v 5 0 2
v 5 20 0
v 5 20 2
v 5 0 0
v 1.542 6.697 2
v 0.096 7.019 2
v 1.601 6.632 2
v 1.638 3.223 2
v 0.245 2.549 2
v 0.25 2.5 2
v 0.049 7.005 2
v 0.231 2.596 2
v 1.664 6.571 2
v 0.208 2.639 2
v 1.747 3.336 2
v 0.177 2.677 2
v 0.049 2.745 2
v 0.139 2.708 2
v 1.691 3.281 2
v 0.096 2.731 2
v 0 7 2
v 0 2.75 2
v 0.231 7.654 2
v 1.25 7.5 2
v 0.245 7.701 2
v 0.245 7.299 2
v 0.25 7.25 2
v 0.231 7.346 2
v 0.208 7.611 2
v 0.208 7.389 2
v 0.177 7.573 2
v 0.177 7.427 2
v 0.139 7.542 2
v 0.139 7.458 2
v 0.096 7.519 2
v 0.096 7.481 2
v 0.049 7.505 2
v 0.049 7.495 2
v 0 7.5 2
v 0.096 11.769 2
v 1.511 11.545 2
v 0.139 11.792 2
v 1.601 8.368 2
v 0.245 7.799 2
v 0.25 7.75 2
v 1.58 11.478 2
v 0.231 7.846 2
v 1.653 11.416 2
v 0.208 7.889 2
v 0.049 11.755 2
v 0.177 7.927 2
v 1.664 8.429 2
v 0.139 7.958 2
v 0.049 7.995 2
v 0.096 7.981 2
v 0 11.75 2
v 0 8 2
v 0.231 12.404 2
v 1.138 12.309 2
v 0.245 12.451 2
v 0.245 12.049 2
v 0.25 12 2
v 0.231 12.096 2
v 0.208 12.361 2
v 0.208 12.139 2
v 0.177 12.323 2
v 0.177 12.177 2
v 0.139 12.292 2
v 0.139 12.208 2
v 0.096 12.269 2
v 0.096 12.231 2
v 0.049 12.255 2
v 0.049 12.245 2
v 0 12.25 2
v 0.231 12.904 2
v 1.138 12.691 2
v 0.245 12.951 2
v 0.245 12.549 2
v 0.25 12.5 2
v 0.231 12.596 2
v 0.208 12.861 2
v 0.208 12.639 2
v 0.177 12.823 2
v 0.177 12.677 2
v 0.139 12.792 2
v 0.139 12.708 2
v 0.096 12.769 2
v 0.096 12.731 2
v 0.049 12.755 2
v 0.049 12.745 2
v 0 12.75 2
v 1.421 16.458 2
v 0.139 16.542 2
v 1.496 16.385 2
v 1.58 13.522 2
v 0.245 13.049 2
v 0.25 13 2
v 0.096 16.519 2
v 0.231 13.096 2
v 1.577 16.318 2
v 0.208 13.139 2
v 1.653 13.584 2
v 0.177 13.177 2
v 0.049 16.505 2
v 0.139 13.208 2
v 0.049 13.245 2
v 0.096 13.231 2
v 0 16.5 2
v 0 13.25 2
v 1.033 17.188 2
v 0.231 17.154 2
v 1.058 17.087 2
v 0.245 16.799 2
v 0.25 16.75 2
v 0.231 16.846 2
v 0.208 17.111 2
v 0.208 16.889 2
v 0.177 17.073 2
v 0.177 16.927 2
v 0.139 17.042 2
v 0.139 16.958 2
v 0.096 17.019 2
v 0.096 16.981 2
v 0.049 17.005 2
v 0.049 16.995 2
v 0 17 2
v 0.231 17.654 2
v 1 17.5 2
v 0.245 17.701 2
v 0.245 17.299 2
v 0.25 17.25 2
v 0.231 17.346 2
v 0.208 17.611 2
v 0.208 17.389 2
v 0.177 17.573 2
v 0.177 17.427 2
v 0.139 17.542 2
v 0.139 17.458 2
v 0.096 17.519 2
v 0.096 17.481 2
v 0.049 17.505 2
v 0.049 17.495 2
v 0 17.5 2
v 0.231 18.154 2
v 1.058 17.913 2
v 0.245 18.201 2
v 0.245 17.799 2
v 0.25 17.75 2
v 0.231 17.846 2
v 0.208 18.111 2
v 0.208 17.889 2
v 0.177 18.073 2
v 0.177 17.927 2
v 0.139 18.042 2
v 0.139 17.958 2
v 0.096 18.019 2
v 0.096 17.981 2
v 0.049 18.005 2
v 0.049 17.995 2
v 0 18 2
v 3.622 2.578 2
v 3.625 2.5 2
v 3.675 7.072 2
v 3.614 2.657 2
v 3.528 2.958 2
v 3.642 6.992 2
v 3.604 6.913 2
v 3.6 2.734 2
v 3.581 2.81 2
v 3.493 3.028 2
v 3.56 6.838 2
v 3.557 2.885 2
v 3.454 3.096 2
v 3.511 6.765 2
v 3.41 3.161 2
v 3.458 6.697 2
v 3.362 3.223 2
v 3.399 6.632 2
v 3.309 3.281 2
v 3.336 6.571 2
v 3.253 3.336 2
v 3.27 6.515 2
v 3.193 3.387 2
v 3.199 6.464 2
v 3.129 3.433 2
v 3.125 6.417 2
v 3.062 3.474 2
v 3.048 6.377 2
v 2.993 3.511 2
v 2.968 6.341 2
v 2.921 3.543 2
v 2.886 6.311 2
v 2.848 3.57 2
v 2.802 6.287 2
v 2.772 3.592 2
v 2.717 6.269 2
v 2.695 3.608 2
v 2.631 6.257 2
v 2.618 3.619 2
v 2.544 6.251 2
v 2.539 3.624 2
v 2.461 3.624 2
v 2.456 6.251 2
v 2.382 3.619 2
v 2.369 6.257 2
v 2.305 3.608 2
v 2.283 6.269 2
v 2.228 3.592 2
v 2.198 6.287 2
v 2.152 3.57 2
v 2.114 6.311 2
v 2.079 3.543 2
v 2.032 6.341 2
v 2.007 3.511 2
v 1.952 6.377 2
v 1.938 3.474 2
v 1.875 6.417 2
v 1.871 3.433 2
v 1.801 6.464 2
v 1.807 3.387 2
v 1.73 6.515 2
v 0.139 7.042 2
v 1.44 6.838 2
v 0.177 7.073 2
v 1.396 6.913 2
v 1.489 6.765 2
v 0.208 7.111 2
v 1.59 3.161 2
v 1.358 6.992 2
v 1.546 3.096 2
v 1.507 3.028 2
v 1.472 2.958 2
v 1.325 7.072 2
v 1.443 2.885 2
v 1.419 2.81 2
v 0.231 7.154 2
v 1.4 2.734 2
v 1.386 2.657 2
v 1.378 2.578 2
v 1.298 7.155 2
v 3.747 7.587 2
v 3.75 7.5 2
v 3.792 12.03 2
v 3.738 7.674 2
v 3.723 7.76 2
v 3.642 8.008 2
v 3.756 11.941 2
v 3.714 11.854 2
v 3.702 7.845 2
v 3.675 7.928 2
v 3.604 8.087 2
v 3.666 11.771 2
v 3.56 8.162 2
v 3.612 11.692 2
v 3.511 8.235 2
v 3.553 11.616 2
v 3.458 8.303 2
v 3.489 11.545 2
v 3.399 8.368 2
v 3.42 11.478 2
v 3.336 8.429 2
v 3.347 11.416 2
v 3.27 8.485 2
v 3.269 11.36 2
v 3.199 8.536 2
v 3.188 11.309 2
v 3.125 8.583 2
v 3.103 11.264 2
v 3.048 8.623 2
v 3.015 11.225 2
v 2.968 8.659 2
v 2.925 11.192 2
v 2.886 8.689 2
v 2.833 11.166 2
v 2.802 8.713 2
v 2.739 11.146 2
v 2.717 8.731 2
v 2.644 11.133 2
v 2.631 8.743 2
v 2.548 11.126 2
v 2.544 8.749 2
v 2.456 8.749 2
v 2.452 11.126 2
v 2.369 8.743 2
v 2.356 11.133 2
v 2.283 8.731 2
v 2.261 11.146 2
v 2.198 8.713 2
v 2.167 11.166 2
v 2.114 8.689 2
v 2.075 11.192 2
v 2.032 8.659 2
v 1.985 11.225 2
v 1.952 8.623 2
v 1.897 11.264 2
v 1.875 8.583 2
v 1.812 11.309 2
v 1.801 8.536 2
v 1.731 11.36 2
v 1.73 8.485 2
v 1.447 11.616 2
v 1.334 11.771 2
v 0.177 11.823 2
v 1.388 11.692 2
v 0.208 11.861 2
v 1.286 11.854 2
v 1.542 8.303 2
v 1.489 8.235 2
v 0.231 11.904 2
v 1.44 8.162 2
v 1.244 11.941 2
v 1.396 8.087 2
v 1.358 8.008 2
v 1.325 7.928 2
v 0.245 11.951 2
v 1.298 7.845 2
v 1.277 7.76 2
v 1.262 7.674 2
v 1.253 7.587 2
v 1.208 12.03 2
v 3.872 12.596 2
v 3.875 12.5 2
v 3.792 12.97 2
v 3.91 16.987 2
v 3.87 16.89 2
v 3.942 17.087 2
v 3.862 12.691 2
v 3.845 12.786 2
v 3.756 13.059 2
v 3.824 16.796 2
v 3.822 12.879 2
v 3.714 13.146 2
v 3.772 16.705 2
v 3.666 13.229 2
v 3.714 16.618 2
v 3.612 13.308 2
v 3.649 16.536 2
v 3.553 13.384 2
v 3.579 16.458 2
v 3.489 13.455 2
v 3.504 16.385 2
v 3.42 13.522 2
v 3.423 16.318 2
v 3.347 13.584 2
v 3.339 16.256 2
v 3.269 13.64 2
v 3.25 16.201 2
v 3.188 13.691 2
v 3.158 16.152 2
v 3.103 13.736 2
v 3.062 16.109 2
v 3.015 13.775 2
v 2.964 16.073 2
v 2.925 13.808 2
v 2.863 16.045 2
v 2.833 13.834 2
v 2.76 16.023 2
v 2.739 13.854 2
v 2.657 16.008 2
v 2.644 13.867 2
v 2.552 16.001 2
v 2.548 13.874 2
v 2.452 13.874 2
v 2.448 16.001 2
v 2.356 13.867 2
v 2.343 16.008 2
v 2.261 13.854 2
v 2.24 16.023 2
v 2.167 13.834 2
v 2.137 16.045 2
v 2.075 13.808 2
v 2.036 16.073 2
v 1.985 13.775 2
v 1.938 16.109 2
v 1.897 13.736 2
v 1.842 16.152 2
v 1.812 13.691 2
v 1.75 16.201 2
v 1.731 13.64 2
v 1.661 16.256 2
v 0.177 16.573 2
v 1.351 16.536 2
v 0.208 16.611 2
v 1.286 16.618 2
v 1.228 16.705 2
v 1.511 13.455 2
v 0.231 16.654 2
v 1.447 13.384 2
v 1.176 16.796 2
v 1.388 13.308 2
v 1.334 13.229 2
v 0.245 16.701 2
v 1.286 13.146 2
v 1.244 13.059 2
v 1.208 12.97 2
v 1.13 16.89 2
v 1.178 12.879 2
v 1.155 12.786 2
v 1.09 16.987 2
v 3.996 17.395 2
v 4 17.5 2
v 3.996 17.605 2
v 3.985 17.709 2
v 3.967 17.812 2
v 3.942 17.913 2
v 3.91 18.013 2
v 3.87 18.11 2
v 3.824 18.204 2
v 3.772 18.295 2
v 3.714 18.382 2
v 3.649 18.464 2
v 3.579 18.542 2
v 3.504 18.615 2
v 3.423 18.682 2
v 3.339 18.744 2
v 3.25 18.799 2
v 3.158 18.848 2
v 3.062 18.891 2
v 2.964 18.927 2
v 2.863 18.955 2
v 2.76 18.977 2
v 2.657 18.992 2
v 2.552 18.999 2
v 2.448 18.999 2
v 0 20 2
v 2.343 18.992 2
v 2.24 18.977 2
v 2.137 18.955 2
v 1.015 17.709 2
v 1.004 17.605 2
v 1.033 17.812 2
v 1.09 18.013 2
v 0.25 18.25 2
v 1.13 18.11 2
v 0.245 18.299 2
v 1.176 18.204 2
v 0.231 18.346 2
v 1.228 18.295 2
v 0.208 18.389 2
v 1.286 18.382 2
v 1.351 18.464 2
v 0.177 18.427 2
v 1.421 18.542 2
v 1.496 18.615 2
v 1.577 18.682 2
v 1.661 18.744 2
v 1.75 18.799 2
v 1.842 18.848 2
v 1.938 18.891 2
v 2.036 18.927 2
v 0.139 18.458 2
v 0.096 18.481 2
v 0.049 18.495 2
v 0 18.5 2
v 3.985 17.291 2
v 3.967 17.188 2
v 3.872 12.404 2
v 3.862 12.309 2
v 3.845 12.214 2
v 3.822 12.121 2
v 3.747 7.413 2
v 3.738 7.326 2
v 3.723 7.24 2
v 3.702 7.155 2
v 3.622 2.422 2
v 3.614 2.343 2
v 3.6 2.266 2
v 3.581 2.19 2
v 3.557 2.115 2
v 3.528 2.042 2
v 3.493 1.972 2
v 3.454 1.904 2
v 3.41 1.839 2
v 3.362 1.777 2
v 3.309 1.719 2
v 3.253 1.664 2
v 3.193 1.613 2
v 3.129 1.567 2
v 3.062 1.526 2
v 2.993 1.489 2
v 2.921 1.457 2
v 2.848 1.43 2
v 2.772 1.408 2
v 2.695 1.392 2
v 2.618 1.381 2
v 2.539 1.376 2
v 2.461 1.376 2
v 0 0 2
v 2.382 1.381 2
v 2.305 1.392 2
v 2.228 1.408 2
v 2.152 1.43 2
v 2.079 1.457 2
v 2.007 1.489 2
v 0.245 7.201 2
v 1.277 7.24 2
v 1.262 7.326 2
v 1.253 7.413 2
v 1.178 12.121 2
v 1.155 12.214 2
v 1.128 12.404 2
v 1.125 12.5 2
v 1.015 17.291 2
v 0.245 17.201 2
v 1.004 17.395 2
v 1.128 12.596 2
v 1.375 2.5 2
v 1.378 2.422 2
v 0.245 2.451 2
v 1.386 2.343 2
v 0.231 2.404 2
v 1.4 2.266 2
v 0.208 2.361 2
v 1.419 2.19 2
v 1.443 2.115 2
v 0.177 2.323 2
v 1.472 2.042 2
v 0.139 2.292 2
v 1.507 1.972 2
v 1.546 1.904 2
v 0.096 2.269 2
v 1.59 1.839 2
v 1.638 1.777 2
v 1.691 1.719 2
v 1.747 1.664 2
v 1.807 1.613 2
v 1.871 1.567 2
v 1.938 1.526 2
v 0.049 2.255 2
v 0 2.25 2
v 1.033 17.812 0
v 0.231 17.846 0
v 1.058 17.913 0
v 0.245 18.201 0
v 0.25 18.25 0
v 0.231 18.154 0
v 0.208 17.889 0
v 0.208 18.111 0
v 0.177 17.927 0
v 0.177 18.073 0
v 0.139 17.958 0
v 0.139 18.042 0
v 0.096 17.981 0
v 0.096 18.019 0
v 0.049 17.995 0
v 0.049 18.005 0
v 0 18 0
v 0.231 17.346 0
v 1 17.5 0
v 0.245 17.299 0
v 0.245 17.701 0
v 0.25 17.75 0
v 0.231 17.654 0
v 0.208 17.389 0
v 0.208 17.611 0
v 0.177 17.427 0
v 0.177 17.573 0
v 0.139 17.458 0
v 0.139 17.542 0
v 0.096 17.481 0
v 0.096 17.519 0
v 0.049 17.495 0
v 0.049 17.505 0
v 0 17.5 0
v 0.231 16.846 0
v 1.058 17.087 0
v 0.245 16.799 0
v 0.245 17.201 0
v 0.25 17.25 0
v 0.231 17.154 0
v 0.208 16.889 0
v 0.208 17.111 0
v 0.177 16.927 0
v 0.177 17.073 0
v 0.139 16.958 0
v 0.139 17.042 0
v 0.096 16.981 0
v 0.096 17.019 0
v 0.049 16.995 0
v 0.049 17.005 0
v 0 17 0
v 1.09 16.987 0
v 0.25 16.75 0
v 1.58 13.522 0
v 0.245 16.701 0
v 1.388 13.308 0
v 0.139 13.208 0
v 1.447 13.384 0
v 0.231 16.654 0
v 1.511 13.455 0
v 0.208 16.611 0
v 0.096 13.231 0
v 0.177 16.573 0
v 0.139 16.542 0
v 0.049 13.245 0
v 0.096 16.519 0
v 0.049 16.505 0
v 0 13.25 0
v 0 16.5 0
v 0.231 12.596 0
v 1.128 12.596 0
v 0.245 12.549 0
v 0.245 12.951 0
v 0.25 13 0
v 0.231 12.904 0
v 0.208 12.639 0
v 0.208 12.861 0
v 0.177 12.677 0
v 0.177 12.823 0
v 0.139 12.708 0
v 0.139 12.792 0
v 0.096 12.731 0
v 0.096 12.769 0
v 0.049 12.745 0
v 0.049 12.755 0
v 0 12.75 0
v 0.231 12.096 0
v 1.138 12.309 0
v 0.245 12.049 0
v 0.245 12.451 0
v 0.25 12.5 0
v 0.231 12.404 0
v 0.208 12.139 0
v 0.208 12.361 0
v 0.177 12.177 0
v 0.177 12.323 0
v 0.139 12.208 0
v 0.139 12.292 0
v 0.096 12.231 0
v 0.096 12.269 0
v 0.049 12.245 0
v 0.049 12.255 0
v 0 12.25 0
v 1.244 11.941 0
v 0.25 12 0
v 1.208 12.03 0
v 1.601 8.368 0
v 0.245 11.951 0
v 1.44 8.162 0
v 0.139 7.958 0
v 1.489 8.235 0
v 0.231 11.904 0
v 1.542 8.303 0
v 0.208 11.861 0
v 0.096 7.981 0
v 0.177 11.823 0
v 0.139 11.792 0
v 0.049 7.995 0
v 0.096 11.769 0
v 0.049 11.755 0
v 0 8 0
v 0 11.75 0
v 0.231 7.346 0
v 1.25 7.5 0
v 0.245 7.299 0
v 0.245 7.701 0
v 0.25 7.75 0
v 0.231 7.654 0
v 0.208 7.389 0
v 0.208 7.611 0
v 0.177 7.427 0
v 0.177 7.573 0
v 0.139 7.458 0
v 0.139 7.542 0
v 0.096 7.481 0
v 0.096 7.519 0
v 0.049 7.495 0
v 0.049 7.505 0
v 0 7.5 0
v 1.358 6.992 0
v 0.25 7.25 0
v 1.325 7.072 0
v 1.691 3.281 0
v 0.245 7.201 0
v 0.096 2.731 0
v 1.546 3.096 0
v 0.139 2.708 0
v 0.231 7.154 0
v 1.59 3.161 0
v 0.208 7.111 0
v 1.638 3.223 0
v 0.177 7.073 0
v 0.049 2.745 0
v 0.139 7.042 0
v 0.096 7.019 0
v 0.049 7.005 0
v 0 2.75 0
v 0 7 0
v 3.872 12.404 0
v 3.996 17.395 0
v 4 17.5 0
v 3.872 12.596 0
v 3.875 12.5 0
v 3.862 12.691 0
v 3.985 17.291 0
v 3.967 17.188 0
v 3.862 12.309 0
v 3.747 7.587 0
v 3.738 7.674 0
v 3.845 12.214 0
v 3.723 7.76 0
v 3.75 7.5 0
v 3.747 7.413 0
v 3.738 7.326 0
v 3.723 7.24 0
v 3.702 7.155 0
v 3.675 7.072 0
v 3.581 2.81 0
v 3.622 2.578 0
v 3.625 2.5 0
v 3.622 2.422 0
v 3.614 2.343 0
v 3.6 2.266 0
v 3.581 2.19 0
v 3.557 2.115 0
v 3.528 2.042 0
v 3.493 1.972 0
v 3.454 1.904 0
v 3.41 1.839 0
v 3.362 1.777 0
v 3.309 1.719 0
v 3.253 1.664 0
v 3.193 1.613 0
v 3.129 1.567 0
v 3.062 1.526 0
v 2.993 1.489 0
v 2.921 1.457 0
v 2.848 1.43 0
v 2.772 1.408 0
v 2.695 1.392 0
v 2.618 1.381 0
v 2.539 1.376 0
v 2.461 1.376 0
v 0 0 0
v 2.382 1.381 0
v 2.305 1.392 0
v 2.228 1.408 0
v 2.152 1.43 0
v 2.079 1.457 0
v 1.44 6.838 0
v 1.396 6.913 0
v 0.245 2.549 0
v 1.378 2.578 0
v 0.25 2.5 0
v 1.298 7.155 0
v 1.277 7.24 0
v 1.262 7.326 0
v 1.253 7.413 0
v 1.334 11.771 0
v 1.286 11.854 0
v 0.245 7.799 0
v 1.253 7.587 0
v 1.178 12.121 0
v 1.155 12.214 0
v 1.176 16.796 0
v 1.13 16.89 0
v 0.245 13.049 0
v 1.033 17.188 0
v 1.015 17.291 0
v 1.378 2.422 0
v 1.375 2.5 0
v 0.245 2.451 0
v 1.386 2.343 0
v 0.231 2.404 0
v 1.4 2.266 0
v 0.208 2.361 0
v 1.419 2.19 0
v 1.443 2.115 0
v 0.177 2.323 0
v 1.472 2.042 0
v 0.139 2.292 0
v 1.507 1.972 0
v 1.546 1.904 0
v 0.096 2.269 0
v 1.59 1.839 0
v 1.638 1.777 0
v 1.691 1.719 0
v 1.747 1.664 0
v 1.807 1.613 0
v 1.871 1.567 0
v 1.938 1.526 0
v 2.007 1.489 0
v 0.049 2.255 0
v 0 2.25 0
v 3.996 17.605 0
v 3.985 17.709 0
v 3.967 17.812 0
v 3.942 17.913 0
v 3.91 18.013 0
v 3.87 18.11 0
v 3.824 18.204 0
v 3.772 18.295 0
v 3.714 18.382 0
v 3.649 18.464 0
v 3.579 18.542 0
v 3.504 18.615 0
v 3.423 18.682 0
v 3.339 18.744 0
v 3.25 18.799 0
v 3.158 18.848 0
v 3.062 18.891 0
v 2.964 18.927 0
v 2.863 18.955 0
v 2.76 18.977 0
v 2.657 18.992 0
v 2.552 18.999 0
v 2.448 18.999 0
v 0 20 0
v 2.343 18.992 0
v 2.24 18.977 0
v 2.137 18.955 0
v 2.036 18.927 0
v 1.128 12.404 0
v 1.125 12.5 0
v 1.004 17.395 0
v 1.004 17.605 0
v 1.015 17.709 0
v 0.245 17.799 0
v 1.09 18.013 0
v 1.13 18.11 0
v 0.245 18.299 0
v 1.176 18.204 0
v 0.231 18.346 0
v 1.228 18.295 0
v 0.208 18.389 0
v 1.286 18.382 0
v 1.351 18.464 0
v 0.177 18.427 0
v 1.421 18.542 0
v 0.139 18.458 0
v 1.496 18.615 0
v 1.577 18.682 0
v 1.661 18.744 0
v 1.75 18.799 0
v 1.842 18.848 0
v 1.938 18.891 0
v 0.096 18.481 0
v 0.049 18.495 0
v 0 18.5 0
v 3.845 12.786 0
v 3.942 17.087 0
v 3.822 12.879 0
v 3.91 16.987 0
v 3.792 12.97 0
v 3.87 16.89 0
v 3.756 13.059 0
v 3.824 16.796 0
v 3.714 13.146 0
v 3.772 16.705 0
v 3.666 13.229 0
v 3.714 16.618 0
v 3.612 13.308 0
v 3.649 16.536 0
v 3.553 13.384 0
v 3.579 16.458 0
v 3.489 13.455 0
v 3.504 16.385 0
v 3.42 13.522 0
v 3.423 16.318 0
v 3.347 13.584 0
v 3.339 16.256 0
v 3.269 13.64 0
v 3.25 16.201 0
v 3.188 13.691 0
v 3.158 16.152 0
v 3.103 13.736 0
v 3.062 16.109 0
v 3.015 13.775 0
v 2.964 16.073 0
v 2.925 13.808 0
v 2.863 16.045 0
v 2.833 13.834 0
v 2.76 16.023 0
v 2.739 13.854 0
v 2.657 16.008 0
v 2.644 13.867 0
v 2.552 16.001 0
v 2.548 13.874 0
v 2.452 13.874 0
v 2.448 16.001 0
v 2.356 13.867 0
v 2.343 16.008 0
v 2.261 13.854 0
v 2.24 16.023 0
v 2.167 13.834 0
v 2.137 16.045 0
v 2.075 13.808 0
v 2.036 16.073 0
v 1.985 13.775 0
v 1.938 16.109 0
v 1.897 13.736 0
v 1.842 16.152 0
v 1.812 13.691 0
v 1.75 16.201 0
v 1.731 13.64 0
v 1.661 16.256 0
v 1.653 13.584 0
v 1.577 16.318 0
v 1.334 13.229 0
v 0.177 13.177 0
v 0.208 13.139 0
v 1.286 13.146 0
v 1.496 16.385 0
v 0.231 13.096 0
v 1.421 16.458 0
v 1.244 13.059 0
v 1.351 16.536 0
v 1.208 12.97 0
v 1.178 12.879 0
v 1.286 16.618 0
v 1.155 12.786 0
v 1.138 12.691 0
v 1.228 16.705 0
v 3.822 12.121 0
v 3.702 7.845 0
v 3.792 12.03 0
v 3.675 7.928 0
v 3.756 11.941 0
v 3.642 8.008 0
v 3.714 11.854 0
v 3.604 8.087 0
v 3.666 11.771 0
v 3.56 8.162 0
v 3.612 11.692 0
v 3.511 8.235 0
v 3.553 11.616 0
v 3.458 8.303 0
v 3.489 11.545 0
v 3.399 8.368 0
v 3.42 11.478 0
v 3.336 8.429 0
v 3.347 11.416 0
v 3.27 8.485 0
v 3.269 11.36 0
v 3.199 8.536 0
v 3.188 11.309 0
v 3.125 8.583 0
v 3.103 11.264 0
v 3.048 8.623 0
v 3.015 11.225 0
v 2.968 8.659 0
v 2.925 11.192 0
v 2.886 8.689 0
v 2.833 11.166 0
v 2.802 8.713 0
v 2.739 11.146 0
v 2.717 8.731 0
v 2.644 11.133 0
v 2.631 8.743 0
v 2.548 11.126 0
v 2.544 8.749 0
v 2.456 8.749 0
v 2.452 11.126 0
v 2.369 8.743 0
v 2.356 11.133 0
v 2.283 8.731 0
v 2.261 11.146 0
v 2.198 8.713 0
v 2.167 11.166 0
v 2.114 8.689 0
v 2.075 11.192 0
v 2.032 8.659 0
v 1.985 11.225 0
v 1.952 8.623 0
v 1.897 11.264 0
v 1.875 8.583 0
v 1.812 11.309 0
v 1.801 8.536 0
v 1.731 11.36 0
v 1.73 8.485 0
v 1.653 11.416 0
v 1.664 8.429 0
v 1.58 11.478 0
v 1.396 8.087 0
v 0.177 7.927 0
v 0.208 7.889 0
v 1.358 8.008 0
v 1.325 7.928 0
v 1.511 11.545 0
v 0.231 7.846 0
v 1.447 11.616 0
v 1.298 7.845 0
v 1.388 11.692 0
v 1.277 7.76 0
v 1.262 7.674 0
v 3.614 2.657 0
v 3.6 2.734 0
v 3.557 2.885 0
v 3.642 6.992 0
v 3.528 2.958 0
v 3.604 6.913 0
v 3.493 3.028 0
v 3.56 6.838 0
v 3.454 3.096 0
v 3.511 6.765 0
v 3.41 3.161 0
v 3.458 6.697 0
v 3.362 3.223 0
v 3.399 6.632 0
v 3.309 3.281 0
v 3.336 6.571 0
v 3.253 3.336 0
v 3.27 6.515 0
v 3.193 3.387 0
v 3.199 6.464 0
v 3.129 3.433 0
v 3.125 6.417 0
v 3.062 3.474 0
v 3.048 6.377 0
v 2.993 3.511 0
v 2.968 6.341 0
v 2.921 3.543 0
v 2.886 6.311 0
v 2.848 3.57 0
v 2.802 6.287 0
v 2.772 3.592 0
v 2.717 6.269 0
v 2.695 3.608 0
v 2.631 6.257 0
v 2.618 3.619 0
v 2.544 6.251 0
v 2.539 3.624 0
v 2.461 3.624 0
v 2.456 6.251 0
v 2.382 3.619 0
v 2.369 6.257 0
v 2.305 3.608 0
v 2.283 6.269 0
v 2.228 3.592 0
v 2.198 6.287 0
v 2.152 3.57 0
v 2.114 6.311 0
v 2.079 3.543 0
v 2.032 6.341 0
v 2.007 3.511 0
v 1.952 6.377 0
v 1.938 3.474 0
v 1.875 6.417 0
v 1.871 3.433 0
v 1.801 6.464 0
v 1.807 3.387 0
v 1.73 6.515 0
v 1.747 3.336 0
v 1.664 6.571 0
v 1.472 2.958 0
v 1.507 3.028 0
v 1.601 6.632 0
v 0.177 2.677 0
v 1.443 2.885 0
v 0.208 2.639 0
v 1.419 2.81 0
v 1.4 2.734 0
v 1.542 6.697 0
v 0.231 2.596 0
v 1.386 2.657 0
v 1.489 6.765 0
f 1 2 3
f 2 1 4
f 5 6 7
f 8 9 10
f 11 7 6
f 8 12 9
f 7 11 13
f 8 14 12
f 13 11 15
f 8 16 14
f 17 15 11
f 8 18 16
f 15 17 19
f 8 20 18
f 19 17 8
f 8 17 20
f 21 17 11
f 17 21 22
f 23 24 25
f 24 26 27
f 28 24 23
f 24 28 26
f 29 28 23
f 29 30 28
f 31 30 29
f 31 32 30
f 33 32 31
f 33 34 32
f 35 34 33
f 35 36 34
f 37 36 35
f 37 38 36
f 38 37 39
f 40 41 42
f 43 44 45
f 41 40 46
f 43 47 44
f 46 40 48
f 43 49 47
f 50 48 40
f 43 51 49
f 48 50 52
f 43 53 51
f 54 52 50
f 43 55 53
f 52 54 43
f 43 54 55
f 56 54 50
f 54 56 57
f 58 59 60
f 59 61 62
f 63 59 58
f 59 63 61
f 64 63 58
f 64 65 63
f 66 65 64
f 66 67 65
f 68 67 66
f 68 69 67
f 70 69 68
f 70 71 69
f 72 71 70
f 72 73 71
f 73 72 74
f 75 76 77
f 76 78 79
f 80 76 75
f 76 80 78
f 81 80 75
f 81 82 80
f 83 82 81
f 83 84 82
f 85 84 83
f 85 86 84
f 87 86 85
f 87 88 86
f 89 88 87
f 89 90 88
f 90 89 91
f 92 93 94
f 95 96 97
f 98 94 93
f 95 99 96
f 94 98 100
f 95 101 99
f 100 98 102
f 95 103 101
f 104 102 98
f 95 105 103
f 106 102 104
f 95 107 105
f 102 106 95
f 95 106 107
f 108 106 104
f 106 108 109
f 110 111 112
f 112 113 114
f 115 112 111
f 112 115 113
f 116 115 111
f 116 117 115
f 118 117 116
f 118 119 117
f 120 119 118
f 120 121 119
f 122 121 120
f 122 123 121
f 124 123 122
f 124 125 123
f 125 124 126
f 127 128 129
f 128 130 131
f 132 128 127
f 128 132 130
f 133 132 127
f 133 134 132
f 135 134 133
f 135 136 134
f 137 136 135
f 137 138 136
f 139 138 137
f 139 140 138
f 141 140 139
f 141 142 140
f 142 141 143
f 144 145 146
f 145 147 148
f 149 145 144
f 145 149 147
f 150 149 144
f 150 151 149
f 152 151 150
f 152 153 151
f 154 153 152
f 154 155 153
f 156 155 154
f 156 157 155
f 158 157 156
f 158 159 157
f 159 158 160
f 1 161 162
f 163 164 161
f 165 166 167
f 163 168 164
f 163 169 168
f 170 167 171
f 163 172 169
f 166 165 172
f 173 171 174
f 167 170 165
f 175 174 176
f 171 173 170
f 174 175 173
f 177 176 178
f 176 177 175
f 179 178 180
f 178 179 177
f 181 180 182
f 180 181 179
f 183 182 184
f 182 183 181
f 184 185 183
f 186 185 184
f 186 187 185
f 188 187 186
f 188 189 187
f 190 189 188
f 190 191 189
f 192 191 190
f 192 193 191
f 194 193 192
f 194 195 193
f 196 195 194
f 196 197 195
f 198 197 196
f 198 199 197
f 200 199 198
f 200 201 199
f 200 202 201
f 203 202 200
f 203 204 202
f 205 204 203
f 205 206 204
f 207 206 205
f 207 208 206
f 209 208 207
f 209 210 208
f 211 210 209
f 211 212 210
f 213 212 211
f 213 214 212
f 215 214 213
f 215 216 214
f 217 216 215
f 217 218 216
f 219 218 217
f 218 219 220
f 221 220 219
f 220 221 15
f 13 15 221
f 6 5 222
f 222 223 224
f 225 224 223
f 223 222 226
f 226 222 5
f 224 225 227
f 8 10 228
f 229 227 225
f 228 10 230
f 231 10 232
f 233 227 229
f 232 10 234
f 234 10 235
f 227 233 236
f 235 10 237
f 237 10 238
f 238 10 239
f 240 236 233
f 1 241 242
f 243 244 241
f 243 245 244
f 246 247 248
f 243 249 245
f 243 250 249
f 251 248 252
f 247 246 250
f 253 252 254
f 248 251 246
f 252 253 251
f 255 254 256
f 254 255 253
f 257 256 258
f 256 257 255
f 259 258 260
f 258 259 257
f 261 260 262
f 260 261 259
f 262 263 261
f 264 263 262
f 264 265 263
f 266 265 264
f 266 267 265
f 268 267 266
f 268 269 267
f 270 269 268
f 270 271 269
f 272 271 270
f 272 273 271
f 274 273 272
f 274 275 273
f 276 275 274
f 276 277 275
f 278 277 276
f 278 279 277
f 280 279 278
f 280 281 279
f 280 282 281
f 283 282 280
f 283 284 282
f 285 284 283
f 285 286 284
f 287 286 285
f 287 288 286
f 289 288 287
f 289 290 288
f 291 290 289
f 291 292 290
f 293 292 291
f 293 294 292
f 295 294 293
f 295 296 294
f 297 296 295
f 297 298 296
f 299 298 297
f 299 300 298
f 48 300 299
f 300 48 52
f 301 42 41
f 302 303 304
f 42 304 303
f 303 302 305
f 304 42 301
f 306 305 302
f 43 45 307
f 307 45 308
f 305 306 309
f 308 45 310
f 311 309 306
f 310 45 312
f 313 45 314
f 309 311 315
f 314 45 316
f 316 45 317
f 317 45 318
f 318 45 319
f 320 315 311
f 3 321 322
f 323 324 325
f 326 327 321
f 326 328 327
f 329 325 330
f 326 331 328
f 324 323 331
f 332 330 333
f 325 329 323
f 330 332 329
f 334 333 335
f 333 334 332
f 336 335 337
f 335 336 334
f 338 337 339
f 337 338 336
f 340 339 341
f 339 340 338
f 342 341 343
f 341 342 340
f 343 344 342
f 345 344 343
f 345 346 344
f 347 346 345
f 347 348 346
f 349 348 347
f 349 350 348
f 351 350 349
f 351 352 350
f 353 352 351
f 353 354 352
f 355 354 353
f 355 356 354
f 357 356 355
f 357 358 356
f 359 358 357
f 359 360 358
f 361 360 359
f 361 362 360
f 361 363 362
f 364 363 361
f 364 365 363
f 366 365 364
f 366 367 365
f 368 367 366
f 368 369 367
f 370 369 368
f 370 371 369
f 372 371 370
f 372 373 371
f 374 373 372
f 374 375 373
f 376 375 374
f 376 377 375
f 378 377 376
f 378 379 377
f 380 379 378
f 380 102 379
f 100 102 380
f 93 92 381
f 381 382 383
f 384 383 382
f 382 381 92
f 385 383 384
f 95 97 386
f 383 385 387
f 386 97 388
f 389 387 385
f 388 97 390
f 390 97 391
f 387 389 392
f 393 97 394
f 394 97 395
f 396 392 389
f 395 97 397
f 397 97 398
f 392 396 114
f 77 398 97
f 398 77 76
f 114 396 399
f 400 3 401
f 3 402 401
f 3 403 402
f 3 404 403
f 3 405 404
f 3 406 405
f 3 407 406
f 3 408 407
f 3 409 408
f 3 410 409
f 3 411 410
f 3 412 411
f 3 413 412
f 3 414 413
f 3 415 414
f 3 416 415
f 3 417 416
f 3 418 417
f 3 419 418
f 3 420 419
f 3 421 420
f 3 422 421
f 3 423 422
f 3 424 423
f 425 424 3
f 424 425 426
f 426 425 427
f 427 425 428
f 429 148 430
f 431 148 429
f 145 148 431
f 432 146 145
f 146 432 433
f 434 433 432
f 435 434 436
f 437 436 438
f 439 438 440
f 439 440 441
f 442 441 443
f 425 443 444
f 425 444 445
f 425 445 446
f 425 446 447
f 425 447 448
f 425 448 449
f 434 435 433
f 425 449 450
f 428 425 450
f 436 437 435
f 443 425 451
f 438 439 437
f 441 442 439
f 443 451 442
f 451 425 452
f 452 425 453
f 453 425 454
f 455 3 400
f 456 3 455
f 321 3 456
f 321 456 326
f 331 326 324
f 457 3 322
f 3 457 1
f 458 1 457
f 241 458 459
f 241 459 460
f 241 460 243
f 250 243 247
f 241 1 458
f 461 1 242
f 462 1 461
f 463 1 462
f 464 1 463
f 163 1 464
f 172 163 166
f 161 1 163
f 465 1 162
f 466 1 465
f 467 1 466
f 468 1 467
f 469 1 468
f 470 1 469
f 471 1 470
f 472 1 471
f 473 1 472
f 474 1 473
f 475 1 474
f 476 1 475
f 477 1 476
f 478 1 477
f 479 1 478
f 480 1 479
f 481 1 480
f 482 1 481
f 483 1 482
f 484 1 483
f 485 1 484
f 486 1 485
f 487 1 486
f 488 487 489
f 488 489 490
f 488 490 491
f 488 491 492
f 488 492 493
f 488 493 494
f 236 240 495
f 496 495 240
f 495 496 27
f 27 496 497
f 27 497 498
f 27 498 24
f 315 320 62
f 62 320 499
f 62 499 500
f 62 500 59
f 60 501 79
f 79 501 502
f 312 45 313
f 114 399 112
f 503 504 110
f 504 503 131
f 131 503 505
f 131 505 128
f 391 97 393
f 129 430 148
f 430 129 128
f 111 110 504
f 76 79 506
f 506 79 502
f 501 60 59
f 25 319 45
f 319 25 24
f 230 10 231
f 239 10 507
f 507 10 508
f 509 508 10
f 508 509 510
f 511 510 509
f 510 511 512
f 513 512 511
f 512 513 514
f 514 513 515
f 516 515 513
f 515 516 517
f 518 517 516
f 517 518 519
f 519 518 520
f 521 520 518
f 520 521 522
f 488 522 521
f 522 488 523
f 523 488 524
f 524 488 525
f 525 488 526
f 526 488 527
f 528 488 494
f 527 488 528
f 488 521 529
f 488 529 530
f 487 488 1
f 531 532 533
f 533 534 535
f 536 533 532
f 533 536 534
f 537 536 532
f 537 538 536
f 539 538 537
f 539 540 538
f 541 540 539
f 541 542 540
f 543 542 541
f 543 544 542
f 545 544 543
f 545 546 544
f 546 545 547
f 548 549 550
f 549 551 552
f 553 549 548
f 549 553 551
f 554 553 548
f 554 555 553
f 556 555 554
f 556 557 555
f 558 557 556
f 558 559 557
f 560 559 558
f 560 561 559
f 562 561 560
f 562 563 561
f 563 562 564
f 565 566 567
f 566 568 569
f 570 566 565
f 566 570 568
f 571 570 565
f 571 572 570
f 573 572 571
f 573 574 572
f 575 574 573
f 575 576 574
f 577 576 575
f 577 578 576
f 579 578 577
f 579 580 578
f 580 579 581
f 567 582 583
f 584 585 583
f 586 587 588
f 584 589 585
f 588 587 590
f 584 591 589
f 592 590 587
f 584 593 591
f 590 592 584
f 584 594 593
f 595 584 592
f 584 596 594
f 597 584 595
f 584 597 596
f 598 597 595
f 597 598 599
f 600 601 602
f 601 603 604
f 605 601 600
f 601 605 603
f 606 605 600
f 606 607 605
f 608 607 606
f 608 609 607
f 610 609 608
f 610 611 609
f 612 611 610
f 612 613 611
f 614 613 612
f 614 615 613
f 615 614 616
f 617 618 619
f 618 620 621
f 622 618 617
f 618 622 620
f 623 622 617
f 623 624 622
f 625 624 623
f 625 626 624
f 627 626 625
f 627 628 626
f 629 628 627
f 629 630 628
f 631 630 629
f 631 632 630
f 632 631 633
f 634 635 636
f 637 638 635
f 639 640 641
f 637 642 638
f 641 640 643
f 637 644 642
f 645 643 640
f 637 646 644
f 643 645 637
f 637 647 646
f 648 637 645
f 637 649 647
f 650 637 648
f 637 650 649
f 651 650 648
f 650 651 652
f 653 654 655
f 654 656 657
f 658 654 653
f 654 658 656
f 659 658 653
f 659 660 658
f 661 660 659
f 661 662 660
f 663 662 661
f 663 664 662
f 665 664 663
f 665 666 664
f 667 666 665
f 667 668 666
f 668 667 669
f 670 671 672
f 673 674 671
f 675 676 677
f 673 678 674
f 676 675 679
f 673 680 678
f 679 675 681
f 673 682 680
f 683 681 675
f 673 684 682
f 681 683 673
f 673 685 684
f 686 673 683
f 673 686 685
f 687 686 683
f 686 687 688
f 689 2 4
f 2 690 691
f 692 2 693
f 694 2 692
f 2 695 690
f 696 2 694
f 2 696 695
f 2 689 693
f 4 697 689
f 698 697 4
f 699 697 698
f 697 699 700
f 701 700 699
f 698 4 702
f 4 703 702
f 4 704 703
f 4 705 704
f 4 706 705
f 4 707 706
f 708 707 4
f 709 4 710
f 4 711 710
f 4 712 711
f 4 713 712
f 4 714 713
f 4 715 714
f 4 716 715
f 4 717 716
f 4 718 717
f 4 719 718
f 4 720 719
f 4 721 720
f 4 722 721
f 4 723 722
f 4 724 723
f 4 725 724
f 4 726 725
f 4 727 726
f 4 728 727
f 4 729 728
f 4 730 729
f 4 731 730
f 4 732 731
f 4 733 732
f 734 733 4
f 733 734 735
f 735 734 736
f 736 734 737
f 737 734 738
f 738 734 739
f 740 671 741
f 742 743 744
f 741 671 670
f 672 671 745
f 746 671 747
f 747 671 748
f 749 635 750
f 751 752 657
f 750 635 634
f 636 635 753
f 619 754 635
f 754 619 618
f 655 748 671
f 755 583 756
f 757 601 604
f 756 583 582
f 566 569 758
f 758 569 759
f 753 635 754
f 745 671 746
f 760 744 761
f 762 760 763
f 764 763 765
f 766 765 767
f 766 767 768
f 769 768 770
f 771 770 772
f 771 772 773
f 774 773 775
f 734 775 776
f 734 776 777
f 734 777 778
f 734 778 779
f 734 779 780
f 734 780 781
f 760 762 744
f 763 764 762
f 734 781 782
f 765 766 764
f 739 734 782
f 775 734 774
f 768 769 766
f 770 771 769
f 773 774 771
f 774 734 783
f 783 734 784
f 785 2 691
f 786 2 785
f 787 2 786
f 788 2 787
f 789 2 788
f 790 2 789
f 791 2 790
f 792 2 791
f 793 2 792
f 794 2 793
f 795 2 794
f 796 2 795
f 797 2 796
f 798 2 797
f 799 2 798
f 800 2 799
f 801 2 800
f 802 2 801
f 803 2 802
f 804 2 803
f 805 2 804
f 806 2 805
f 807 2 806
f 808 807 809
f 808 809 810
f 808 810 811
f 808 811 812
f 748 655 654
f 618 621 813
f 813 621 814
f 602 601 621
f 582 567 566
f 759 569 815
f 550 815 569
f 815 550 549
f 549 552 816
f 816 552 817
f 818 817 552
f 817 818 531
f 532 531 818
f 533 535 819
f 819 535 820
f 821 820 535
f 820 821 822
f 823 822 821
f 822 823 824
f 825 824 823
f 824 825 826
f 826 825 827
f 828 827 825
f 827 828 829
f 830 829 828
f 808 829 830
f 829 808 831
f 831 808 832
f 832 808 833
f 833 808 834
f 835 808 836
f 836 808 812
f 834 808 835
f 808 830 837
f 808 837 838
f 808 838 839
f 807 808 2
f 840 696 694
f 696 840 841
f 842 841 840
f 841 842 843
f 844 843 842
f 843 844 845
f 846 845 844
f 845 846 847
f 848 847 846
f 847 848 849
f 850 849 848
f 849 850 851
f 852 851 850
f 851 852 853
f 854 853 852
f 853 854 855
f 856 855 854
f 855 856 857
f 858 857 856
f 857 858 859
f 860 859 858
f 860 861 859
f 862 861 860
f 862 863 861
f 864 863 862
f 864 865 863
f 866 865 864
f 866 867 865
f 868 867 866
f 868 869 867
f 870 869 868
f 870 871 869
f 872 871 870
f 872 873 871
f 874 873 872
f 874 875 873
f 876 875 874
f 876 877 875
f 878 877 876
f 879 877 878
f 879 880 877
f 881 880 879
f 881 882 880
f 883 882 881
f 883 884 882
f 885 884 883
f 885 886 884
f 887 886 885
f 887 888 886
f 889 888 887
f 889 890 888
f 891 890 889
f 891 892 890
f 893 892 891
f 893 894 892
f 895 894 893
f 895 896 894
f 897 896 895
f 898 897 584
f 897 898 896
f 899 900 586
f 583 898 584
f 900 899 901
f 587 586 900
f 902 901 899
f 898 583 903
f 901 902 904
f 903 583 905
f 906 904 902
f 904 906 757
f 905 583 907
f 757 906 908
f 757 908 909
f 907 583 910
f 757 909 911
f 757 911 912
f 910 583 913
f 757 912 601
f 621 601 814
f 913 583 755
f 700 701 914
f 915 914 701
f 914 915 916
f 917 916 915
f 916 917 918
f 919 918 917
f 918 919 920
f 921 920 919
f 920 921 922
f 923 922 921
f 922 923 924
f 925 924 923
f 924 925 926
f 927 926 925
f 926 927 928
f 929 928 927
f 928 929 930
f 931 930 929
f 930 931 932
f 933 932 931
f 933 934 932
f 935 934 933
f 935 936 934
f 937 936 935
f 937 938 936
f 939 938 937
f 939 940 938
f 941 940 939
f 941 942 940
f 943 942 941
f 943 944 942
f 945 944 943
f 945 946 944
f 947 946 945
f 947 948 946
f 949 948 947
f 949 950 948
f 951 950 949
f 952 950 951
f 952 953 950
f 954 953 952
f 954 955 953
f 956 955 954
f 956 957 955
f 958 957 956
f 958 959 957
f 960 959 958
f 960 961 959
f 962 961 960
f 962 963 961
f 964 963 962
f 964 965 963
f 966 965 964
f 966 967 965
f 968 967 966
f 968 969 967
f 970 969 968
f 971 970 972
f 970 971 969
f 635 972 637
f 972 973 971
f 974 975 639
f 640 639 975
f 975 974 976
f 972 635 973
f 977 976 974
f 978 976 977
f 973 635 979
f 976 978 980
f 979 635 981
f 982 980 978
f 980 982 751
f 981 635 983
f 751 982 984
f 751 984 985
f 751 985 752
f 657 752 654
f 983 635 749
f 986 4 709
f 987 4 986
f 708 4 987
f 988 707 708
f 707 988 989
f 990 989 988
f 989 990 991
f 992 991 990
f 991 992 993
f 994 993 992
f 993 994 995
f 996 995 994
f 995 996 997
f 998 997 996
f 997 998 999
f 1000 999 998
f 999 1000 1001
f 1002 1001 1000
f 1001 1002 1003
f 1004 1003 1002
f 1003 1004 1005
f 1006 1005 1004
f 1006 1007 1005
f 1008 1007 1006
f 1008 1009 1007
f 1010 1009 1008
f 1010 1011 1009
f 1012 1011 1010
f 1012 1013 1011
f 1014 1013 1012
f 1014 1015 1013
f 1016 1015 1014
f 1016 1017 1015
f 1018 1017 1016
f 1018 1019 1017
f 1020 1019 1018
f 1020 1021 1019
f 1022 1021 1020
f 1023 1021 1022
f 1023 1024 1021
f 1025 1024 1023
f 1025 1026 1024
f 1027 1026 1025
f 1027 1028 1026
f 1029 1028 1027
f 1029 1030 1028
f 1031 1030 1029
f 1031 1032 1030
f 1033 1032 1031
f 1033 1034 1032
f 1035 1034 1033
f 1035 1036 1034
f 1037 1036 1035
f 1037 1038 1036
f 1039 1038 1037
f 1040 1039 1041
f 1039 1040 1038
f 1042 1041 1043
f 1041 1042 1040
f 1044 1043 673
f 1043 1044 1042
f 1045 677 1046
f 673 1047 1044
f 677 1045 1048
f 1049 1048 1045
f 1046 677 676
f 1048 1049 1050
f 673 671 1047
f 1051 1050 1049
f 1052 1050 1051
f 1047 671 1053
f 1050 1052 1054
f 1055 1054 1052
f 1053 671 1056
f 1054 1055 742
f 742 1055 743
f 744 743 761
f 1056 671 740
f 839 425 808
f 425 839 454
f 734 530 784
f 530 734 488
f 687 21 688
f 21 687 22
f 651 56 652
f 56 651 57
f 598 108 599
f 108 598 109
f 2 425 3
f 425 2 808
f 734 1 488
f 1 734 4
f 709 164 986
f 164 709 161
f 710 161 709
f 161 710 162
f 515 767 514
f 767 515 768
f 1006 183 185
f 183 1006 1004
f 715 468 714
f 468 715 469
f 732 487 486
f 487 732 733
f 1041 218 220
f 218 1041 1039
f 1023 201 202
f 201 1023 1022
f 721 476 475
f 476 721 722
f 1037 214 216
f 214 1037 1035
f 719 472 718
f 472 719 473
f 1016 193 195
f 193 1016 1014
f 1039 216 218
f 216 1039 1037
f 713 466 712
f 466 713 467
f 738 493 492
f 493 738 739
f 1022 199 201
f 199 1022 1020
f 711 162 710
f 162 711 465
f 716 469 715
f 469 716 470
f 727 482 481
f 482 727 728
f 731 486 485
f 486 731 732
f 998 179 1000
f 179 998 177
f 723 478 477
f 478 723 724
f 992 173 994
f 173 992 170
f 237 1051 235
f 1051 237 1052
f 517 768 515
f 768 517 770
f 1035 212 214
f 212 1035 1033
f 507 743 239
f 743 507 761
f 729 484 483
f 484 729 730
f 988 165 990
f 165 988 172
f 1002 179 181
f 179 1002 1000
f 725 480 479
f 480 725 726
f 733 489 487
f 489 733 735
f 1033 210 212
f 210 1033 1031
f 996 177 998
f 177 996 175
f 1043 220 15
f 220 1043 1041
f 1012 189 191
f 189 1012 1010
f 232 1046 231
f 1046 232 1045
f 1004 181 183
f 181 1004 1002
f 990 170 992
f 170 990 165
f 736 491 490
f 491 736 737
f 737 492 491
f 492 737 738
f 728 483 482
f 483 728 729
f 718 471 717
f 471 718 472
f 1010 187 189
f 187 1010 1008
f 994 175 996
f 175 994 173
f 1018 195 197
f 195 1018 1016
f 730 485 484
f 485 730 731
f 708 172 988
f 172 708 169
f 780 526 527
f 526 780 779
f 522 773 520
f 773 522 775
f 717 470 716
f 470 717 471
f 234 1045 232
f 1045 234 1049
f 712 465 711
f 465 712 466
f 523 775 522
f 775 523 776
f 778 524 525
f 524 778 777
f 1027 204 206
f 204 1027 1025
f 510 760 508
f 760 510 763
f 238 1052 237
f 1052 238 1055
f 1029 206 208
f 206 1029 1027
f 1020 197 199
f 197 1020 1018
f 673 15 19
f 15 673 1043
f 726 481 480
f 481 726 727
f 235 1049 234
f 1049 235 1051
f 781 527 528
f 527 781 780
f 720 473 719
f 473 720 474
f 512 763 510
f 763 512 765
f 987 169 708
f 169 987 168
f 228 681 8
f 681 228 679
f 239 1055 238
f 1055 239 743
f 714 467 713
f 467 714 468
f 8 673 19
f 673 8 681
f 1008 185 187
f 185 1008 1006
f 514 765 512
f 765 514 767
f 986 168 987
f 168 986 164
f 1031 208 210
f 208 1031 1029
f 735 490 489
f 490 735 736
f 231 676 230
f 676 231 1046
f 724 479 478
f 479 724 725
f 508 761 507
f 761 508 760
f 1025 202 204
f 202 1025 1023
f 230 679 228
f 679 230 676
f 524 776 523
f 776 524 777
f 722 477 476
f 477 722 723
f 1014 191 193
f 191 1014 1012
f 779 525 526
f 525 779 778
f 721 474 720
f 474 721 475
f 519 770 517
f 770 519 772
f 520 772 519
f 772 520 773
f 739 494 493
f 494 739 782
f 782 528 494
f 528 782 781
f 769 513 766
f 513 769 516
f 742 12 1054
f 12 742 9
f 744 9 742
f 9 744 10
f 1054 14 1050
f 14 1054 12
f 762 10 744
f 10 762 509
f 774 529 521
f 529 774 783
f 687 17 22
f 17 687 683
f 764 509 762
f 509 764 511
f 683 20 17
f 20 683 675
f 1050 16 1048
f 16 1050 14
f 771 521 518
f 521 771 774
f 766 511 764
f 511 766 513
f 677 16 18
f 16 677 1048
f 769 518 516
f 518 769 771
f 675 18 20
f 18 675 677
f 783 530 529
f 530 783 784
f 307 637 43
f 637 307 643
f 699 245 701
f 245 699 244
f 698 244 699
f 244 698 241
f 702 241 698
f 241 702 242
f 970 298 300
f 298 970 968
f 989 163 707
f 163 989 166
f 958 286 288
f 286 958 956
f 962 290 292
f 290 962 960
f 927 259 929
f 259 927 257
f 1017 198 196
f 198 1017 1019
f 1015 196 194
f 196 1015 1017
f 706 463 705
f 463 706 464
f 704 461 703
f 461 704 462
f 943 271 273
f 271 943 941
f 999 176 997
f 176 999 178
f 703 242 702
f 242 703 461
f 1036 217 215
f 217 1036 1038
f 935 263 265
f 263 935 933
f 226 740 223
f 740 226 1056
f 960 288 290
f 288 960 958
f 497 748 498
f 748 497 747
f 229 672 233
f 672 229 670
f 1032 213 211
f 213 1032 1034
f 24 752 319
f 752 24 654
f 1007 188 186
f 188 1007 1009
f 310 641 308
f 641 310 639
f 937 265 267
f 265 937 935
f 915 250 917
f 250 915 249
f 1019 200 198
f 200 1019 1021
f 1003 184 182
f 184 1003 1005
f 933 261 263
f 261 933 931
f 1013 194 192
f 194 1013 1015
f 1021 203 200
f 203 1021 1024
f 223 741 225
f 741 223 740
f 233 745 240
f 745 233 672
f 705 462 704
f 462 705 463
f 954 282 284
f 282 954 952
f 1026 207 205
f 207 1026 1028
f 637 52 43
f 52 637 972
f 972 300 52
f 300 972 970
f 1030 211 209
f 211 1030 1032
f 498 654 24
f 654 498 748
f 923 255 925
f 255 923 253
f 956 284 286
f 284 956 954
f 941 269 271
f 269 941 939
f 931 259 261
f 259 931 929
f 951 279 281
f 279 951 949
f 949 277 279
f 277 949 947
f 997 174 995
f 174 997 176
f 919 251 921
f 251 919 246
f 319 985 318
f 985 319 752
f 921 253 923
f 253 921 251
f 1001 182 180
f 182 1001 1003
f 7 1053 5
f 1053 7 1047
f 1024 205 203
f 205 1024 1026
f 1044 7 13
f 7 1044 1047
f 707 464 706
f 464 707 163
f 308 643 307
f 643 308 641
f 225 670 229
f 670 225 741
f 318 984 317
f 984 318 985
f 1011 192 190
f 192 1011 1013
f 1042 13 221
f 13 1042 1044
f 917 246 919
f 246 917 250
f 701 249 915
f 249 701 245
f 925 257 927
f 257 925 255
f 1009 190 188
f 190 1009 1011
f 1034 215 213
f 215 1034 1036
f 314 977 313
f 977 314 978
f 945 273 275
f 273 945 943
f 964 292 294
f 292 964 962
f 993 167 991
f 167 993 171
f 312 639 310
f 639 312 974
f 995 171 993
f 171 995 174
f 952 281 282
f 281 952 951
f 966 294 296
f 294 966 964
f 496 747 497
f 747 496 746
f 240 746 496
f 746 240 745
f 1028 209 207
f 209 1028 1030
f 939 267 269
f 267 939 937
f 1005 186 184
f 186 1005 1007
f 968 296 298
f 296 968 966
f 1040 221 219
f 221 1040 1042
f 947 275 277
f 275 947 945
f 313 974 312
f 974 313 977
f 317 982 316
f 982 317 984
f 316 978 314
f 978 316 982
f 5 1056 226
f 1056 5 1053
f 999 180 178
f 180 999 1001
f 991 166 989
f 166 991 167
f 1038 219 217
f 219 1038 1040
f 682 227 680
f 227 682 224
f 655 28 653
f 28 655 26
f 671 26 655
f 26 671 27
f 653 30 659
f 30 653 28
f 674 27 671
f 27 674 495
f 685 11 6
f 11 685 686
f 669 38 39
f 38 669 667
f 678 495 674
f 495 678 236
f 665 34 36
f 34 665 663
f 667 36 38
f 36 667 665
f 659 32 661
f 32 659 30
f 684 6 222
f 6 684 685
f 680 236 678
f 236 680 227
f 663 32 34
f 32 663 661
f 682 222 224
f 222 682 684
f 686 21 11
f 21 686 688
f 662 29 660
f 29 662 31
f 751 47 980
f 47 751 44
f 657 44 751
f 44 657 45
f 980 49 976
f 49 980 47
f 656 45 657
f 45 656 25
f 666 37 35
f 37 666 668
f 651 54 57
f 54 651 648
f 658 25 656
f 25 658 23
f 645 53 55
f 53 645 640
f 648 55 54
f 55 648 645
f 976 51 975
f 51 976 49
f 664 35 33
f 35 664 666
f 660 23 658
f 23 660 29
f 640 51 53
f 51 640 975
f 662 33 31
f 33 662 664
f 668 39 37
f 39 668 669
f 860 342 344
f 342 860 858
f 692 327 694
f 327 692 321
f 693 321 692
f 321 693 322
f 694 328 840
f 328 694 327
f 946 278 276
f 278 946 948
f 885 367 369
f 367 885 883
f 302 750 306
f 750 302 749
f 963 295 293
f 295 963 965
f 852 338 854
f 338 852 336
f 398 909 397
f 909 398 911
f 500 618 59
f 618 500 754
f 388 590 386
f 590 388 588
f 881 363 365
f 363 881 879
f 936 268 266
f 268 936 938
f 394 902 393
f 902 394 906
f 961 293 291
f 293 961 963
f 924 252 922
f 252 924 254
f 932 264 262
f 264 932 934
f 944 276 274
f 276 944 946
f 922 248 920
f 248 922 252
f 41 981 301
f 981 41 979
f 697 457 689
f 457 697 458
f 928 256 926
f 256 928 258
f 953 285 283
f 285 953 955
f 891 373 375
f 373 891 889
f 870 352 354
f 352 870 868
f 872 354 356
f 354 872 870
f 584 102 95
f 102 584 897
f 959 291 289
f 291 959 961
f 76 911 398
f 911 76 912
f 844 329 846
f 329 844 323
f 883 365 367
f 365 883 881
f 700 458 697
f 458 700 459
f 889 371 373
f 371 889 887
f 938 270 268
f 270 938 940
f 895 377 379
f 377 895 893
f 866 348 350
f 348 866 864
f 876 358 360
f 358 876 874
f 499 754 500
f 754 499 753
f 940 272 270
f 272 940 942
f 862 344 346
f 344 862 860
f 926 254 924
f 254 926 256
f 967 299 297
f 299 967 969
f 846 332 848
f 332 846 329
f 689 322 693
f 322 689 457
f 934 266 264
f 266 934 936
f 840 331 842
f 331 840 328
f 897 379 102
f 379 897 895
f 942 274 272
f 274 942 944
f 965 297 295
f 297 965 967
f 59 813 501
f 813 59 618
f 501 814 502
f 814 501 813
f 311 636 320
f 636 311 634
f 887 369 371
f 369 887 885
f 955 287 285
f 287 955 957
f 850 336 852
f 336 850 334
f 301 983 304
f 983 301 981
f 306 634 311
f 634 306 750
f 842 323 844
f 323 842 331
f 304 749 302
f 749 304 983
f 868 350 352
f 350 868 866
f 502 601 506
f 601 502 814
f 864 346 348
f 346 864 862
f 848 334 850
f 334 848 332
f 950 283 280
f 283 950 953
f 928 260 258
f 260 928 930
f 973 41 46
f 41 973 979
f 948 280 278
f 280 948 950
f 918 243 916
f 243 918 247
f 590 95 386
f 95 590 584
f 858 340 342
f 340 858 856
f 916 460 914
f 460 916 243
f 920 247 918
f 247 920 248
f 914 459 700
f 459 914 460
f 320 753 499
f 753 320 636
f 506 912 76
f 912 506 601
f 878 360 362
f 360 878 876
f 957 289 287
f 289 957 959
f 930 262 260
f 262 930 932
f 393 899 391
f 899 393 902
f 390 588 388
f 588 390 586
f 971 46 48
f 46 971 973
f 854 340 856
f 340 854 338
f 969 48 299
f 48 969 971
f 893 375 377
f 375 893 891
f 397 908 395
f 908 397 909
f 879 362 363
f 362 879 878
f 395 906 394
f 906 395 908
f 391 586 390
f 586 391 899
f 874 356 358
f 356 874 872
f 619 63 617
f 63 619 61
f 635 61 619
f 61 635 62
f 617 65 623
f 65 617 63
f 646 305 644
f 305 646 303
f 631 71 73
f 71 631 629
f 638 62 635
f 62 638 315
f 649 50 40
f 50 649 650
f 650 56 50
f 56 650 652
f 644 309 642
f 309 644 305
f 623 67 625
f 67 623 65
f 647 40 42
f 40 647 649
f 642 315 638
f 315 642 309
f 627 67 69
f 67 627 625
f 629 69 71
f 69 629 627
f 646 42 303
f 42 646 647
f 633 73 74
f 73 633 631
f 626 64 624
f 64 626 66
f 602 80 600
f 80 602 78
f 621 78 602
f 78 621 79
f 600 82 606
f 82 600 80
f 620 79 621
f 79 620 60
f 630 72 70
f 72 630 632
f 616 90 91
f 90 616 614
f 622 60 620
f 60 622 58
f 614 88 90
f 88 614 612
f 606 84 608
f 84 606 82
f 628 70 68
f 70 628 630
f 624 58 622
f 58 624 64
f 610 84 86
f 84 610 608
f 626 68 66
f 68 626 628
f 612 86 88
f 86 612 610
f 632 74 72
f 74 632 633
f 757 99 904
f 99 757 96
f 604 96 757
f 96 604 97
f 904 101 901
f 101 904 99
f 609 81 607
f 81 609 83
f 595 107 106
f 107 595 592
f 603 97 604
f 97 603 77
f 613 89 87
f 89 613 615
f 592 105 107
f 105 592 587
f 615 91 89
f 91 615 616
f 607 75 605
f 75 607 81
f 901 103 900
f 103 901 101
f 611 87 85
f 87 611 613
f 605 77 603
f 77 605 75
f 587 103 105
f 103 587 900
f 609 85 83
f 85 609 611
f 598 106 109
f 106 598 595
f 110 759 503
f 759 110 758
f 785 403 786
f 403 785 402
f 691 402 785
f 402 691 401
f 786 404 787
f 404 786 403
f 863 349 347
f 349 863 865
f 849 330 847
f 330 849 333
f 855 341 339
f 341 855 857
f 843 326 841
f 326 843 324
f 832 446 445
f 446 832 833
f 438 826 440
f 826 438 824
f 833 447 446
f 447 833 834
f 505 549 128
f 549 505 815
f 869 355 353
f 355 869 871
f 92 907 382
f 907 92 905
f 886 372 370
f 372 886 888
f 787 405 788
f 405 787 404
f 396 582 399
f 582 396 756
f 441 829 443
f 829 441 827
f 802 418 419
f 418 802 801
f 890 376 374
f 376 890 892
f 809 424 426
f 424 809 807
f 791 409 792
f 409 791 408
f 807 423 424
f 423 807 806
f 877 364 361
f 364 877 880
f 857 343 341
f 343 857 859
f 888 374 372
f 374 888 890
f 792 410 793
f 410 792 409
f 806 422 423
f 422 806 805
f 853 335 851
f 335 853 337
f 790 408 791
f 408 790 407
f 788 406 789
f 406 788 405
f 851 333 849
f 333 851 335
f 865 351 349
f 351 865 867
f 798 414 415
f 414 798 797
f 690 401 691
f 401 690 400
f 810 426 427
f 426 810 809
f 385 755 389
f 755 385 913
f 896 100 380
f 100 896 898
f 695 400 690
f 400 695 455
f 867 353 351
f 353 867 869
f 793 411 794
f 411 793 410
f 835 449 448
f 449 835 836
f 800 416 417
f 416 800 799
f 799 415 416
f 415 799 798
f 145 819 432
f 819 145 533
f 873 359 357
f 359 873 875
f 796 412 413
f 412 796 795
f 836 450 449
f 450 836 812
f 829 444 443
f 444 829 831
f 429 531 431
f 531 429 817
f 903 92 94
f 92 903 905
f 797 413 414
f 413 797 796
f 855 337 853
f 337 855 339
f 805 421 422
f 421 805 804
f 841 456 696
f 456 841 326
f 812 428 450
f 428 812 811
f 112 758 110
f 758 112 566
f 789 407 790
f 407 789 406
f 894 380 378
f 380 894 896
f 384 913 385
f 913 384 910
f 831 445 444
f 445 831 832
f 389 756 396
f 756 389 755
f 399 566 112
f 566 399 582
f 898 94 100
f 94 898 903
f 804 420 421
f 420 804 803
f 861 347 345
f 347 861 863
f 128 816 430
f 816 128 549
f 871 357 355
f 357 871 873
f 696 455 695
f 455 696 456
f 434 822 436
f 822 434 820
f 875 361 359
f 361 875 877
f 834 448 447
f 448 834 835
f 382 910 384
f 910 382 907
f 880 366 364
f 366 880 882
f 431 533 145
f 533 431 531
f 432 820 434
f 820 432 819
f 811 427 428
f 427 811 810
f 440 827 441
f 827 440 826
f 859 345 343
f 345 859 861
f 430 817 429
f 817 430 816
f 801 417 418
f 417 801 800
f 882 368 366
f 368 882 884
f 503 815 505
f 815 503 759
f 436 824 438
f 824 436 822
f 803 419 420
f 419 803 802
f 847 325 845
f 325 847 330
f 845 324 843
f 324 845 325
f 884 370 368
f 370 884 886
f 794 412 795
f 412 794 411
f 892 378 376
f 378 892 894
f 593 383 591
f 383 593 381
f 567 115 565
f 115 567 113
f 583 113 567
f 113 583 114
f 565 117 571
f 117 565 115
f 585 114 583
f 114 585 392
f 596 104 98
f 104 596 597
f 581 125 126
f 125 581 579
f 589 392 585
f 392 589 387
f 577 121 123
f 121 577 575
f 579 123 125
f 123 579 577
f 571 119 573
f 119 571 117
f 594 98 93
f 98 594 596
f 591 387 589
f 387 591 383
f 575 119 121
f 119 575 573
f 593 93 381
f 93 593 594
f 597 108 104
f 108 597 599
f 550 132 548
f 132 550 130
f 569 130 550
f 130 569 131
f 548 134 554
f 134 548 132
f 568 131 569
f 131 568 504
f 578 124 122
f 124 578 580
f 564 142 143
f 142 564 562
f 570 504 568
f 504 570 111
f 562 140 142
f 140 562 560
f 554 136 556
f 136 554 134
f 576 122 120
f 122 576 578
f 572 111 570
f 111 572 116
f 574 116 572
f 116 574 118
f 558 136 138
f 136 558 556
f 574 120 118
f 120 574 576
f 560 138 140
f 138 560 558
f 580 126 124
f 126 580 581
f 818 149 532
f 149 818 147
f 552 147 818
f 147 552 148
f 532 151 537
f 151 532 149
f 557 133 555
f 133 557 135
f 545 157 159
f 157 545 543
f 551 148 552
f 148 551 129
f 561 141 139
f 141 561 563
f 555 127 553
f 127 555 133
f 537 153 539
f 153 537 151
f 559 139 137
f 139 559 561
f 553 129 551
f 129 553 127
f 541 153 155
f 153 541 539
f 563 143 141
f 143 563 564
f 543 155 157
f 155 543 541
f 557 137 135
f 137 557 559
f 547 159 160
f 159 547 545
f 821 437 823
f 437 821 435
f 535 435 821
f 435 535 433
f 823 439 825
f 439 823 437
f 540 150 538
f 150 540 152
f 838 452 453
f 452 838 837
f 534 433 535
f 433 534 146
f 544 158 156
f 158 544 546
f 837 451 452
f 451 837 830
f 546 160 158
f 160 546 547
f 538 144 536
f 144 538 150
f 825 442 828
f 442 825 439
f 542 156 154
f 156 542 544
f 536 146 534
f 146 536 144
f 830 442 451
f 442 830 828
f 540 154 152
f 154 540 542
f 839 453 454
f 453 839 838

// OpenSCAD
$fa=4; // default minimum facet angle is now 0.5
$fs=0.05; // default minimum facet size is now 0.05 mm

difference() {
  cube([5, 20, 2]);

  translate([2.5, 2.5, -.05]) cylinder(r = 1.125, h = 2.1);
  translate([0, 2.5, -.05]) cylinder(r = .25, h = 2.1);

  translate([2.5, 7.5, -.05]) cylinder(r = 1.25, h = 2.1);
  translate([0, 7.25, -.05]) cylinder(r = .25, h = 2.1);
  translate([0, 7.75, -.05]) cylinder(r = .25, h = 2.1);

  translate([2.5, 12.5, -.05]) cylinder(r = 1.375, h = 2.1);
  translate([0, 12, -.05]) cylinder(r = .25, h = 2.1);
  translate([0, 12.5, -.05]) cylinder(r = .25, h = 2.1);
  translate([0, 13, -.05]) cylinder(r = .25, h = 2.1);

  translate([2.5, 17.5, -.05]) cylinder(r = 1.5, h = 2.1);
  translate([0, 16.75, -.05]) cylinder(r = .25, h = 2.1);
  translate([0, 17.25, -.05]) cylinder(r = .25, h = 2.1);
  translate([0, 17.75, -.05]) cylinder(r = .25, h = 2.1);
  translate([0, 18.25, -.05]) cylinder(r = .25, h = 2.1);
}

// 1 = 2.25
// 2 = 2.5
// 3 = 2.75
// 4 = 3
